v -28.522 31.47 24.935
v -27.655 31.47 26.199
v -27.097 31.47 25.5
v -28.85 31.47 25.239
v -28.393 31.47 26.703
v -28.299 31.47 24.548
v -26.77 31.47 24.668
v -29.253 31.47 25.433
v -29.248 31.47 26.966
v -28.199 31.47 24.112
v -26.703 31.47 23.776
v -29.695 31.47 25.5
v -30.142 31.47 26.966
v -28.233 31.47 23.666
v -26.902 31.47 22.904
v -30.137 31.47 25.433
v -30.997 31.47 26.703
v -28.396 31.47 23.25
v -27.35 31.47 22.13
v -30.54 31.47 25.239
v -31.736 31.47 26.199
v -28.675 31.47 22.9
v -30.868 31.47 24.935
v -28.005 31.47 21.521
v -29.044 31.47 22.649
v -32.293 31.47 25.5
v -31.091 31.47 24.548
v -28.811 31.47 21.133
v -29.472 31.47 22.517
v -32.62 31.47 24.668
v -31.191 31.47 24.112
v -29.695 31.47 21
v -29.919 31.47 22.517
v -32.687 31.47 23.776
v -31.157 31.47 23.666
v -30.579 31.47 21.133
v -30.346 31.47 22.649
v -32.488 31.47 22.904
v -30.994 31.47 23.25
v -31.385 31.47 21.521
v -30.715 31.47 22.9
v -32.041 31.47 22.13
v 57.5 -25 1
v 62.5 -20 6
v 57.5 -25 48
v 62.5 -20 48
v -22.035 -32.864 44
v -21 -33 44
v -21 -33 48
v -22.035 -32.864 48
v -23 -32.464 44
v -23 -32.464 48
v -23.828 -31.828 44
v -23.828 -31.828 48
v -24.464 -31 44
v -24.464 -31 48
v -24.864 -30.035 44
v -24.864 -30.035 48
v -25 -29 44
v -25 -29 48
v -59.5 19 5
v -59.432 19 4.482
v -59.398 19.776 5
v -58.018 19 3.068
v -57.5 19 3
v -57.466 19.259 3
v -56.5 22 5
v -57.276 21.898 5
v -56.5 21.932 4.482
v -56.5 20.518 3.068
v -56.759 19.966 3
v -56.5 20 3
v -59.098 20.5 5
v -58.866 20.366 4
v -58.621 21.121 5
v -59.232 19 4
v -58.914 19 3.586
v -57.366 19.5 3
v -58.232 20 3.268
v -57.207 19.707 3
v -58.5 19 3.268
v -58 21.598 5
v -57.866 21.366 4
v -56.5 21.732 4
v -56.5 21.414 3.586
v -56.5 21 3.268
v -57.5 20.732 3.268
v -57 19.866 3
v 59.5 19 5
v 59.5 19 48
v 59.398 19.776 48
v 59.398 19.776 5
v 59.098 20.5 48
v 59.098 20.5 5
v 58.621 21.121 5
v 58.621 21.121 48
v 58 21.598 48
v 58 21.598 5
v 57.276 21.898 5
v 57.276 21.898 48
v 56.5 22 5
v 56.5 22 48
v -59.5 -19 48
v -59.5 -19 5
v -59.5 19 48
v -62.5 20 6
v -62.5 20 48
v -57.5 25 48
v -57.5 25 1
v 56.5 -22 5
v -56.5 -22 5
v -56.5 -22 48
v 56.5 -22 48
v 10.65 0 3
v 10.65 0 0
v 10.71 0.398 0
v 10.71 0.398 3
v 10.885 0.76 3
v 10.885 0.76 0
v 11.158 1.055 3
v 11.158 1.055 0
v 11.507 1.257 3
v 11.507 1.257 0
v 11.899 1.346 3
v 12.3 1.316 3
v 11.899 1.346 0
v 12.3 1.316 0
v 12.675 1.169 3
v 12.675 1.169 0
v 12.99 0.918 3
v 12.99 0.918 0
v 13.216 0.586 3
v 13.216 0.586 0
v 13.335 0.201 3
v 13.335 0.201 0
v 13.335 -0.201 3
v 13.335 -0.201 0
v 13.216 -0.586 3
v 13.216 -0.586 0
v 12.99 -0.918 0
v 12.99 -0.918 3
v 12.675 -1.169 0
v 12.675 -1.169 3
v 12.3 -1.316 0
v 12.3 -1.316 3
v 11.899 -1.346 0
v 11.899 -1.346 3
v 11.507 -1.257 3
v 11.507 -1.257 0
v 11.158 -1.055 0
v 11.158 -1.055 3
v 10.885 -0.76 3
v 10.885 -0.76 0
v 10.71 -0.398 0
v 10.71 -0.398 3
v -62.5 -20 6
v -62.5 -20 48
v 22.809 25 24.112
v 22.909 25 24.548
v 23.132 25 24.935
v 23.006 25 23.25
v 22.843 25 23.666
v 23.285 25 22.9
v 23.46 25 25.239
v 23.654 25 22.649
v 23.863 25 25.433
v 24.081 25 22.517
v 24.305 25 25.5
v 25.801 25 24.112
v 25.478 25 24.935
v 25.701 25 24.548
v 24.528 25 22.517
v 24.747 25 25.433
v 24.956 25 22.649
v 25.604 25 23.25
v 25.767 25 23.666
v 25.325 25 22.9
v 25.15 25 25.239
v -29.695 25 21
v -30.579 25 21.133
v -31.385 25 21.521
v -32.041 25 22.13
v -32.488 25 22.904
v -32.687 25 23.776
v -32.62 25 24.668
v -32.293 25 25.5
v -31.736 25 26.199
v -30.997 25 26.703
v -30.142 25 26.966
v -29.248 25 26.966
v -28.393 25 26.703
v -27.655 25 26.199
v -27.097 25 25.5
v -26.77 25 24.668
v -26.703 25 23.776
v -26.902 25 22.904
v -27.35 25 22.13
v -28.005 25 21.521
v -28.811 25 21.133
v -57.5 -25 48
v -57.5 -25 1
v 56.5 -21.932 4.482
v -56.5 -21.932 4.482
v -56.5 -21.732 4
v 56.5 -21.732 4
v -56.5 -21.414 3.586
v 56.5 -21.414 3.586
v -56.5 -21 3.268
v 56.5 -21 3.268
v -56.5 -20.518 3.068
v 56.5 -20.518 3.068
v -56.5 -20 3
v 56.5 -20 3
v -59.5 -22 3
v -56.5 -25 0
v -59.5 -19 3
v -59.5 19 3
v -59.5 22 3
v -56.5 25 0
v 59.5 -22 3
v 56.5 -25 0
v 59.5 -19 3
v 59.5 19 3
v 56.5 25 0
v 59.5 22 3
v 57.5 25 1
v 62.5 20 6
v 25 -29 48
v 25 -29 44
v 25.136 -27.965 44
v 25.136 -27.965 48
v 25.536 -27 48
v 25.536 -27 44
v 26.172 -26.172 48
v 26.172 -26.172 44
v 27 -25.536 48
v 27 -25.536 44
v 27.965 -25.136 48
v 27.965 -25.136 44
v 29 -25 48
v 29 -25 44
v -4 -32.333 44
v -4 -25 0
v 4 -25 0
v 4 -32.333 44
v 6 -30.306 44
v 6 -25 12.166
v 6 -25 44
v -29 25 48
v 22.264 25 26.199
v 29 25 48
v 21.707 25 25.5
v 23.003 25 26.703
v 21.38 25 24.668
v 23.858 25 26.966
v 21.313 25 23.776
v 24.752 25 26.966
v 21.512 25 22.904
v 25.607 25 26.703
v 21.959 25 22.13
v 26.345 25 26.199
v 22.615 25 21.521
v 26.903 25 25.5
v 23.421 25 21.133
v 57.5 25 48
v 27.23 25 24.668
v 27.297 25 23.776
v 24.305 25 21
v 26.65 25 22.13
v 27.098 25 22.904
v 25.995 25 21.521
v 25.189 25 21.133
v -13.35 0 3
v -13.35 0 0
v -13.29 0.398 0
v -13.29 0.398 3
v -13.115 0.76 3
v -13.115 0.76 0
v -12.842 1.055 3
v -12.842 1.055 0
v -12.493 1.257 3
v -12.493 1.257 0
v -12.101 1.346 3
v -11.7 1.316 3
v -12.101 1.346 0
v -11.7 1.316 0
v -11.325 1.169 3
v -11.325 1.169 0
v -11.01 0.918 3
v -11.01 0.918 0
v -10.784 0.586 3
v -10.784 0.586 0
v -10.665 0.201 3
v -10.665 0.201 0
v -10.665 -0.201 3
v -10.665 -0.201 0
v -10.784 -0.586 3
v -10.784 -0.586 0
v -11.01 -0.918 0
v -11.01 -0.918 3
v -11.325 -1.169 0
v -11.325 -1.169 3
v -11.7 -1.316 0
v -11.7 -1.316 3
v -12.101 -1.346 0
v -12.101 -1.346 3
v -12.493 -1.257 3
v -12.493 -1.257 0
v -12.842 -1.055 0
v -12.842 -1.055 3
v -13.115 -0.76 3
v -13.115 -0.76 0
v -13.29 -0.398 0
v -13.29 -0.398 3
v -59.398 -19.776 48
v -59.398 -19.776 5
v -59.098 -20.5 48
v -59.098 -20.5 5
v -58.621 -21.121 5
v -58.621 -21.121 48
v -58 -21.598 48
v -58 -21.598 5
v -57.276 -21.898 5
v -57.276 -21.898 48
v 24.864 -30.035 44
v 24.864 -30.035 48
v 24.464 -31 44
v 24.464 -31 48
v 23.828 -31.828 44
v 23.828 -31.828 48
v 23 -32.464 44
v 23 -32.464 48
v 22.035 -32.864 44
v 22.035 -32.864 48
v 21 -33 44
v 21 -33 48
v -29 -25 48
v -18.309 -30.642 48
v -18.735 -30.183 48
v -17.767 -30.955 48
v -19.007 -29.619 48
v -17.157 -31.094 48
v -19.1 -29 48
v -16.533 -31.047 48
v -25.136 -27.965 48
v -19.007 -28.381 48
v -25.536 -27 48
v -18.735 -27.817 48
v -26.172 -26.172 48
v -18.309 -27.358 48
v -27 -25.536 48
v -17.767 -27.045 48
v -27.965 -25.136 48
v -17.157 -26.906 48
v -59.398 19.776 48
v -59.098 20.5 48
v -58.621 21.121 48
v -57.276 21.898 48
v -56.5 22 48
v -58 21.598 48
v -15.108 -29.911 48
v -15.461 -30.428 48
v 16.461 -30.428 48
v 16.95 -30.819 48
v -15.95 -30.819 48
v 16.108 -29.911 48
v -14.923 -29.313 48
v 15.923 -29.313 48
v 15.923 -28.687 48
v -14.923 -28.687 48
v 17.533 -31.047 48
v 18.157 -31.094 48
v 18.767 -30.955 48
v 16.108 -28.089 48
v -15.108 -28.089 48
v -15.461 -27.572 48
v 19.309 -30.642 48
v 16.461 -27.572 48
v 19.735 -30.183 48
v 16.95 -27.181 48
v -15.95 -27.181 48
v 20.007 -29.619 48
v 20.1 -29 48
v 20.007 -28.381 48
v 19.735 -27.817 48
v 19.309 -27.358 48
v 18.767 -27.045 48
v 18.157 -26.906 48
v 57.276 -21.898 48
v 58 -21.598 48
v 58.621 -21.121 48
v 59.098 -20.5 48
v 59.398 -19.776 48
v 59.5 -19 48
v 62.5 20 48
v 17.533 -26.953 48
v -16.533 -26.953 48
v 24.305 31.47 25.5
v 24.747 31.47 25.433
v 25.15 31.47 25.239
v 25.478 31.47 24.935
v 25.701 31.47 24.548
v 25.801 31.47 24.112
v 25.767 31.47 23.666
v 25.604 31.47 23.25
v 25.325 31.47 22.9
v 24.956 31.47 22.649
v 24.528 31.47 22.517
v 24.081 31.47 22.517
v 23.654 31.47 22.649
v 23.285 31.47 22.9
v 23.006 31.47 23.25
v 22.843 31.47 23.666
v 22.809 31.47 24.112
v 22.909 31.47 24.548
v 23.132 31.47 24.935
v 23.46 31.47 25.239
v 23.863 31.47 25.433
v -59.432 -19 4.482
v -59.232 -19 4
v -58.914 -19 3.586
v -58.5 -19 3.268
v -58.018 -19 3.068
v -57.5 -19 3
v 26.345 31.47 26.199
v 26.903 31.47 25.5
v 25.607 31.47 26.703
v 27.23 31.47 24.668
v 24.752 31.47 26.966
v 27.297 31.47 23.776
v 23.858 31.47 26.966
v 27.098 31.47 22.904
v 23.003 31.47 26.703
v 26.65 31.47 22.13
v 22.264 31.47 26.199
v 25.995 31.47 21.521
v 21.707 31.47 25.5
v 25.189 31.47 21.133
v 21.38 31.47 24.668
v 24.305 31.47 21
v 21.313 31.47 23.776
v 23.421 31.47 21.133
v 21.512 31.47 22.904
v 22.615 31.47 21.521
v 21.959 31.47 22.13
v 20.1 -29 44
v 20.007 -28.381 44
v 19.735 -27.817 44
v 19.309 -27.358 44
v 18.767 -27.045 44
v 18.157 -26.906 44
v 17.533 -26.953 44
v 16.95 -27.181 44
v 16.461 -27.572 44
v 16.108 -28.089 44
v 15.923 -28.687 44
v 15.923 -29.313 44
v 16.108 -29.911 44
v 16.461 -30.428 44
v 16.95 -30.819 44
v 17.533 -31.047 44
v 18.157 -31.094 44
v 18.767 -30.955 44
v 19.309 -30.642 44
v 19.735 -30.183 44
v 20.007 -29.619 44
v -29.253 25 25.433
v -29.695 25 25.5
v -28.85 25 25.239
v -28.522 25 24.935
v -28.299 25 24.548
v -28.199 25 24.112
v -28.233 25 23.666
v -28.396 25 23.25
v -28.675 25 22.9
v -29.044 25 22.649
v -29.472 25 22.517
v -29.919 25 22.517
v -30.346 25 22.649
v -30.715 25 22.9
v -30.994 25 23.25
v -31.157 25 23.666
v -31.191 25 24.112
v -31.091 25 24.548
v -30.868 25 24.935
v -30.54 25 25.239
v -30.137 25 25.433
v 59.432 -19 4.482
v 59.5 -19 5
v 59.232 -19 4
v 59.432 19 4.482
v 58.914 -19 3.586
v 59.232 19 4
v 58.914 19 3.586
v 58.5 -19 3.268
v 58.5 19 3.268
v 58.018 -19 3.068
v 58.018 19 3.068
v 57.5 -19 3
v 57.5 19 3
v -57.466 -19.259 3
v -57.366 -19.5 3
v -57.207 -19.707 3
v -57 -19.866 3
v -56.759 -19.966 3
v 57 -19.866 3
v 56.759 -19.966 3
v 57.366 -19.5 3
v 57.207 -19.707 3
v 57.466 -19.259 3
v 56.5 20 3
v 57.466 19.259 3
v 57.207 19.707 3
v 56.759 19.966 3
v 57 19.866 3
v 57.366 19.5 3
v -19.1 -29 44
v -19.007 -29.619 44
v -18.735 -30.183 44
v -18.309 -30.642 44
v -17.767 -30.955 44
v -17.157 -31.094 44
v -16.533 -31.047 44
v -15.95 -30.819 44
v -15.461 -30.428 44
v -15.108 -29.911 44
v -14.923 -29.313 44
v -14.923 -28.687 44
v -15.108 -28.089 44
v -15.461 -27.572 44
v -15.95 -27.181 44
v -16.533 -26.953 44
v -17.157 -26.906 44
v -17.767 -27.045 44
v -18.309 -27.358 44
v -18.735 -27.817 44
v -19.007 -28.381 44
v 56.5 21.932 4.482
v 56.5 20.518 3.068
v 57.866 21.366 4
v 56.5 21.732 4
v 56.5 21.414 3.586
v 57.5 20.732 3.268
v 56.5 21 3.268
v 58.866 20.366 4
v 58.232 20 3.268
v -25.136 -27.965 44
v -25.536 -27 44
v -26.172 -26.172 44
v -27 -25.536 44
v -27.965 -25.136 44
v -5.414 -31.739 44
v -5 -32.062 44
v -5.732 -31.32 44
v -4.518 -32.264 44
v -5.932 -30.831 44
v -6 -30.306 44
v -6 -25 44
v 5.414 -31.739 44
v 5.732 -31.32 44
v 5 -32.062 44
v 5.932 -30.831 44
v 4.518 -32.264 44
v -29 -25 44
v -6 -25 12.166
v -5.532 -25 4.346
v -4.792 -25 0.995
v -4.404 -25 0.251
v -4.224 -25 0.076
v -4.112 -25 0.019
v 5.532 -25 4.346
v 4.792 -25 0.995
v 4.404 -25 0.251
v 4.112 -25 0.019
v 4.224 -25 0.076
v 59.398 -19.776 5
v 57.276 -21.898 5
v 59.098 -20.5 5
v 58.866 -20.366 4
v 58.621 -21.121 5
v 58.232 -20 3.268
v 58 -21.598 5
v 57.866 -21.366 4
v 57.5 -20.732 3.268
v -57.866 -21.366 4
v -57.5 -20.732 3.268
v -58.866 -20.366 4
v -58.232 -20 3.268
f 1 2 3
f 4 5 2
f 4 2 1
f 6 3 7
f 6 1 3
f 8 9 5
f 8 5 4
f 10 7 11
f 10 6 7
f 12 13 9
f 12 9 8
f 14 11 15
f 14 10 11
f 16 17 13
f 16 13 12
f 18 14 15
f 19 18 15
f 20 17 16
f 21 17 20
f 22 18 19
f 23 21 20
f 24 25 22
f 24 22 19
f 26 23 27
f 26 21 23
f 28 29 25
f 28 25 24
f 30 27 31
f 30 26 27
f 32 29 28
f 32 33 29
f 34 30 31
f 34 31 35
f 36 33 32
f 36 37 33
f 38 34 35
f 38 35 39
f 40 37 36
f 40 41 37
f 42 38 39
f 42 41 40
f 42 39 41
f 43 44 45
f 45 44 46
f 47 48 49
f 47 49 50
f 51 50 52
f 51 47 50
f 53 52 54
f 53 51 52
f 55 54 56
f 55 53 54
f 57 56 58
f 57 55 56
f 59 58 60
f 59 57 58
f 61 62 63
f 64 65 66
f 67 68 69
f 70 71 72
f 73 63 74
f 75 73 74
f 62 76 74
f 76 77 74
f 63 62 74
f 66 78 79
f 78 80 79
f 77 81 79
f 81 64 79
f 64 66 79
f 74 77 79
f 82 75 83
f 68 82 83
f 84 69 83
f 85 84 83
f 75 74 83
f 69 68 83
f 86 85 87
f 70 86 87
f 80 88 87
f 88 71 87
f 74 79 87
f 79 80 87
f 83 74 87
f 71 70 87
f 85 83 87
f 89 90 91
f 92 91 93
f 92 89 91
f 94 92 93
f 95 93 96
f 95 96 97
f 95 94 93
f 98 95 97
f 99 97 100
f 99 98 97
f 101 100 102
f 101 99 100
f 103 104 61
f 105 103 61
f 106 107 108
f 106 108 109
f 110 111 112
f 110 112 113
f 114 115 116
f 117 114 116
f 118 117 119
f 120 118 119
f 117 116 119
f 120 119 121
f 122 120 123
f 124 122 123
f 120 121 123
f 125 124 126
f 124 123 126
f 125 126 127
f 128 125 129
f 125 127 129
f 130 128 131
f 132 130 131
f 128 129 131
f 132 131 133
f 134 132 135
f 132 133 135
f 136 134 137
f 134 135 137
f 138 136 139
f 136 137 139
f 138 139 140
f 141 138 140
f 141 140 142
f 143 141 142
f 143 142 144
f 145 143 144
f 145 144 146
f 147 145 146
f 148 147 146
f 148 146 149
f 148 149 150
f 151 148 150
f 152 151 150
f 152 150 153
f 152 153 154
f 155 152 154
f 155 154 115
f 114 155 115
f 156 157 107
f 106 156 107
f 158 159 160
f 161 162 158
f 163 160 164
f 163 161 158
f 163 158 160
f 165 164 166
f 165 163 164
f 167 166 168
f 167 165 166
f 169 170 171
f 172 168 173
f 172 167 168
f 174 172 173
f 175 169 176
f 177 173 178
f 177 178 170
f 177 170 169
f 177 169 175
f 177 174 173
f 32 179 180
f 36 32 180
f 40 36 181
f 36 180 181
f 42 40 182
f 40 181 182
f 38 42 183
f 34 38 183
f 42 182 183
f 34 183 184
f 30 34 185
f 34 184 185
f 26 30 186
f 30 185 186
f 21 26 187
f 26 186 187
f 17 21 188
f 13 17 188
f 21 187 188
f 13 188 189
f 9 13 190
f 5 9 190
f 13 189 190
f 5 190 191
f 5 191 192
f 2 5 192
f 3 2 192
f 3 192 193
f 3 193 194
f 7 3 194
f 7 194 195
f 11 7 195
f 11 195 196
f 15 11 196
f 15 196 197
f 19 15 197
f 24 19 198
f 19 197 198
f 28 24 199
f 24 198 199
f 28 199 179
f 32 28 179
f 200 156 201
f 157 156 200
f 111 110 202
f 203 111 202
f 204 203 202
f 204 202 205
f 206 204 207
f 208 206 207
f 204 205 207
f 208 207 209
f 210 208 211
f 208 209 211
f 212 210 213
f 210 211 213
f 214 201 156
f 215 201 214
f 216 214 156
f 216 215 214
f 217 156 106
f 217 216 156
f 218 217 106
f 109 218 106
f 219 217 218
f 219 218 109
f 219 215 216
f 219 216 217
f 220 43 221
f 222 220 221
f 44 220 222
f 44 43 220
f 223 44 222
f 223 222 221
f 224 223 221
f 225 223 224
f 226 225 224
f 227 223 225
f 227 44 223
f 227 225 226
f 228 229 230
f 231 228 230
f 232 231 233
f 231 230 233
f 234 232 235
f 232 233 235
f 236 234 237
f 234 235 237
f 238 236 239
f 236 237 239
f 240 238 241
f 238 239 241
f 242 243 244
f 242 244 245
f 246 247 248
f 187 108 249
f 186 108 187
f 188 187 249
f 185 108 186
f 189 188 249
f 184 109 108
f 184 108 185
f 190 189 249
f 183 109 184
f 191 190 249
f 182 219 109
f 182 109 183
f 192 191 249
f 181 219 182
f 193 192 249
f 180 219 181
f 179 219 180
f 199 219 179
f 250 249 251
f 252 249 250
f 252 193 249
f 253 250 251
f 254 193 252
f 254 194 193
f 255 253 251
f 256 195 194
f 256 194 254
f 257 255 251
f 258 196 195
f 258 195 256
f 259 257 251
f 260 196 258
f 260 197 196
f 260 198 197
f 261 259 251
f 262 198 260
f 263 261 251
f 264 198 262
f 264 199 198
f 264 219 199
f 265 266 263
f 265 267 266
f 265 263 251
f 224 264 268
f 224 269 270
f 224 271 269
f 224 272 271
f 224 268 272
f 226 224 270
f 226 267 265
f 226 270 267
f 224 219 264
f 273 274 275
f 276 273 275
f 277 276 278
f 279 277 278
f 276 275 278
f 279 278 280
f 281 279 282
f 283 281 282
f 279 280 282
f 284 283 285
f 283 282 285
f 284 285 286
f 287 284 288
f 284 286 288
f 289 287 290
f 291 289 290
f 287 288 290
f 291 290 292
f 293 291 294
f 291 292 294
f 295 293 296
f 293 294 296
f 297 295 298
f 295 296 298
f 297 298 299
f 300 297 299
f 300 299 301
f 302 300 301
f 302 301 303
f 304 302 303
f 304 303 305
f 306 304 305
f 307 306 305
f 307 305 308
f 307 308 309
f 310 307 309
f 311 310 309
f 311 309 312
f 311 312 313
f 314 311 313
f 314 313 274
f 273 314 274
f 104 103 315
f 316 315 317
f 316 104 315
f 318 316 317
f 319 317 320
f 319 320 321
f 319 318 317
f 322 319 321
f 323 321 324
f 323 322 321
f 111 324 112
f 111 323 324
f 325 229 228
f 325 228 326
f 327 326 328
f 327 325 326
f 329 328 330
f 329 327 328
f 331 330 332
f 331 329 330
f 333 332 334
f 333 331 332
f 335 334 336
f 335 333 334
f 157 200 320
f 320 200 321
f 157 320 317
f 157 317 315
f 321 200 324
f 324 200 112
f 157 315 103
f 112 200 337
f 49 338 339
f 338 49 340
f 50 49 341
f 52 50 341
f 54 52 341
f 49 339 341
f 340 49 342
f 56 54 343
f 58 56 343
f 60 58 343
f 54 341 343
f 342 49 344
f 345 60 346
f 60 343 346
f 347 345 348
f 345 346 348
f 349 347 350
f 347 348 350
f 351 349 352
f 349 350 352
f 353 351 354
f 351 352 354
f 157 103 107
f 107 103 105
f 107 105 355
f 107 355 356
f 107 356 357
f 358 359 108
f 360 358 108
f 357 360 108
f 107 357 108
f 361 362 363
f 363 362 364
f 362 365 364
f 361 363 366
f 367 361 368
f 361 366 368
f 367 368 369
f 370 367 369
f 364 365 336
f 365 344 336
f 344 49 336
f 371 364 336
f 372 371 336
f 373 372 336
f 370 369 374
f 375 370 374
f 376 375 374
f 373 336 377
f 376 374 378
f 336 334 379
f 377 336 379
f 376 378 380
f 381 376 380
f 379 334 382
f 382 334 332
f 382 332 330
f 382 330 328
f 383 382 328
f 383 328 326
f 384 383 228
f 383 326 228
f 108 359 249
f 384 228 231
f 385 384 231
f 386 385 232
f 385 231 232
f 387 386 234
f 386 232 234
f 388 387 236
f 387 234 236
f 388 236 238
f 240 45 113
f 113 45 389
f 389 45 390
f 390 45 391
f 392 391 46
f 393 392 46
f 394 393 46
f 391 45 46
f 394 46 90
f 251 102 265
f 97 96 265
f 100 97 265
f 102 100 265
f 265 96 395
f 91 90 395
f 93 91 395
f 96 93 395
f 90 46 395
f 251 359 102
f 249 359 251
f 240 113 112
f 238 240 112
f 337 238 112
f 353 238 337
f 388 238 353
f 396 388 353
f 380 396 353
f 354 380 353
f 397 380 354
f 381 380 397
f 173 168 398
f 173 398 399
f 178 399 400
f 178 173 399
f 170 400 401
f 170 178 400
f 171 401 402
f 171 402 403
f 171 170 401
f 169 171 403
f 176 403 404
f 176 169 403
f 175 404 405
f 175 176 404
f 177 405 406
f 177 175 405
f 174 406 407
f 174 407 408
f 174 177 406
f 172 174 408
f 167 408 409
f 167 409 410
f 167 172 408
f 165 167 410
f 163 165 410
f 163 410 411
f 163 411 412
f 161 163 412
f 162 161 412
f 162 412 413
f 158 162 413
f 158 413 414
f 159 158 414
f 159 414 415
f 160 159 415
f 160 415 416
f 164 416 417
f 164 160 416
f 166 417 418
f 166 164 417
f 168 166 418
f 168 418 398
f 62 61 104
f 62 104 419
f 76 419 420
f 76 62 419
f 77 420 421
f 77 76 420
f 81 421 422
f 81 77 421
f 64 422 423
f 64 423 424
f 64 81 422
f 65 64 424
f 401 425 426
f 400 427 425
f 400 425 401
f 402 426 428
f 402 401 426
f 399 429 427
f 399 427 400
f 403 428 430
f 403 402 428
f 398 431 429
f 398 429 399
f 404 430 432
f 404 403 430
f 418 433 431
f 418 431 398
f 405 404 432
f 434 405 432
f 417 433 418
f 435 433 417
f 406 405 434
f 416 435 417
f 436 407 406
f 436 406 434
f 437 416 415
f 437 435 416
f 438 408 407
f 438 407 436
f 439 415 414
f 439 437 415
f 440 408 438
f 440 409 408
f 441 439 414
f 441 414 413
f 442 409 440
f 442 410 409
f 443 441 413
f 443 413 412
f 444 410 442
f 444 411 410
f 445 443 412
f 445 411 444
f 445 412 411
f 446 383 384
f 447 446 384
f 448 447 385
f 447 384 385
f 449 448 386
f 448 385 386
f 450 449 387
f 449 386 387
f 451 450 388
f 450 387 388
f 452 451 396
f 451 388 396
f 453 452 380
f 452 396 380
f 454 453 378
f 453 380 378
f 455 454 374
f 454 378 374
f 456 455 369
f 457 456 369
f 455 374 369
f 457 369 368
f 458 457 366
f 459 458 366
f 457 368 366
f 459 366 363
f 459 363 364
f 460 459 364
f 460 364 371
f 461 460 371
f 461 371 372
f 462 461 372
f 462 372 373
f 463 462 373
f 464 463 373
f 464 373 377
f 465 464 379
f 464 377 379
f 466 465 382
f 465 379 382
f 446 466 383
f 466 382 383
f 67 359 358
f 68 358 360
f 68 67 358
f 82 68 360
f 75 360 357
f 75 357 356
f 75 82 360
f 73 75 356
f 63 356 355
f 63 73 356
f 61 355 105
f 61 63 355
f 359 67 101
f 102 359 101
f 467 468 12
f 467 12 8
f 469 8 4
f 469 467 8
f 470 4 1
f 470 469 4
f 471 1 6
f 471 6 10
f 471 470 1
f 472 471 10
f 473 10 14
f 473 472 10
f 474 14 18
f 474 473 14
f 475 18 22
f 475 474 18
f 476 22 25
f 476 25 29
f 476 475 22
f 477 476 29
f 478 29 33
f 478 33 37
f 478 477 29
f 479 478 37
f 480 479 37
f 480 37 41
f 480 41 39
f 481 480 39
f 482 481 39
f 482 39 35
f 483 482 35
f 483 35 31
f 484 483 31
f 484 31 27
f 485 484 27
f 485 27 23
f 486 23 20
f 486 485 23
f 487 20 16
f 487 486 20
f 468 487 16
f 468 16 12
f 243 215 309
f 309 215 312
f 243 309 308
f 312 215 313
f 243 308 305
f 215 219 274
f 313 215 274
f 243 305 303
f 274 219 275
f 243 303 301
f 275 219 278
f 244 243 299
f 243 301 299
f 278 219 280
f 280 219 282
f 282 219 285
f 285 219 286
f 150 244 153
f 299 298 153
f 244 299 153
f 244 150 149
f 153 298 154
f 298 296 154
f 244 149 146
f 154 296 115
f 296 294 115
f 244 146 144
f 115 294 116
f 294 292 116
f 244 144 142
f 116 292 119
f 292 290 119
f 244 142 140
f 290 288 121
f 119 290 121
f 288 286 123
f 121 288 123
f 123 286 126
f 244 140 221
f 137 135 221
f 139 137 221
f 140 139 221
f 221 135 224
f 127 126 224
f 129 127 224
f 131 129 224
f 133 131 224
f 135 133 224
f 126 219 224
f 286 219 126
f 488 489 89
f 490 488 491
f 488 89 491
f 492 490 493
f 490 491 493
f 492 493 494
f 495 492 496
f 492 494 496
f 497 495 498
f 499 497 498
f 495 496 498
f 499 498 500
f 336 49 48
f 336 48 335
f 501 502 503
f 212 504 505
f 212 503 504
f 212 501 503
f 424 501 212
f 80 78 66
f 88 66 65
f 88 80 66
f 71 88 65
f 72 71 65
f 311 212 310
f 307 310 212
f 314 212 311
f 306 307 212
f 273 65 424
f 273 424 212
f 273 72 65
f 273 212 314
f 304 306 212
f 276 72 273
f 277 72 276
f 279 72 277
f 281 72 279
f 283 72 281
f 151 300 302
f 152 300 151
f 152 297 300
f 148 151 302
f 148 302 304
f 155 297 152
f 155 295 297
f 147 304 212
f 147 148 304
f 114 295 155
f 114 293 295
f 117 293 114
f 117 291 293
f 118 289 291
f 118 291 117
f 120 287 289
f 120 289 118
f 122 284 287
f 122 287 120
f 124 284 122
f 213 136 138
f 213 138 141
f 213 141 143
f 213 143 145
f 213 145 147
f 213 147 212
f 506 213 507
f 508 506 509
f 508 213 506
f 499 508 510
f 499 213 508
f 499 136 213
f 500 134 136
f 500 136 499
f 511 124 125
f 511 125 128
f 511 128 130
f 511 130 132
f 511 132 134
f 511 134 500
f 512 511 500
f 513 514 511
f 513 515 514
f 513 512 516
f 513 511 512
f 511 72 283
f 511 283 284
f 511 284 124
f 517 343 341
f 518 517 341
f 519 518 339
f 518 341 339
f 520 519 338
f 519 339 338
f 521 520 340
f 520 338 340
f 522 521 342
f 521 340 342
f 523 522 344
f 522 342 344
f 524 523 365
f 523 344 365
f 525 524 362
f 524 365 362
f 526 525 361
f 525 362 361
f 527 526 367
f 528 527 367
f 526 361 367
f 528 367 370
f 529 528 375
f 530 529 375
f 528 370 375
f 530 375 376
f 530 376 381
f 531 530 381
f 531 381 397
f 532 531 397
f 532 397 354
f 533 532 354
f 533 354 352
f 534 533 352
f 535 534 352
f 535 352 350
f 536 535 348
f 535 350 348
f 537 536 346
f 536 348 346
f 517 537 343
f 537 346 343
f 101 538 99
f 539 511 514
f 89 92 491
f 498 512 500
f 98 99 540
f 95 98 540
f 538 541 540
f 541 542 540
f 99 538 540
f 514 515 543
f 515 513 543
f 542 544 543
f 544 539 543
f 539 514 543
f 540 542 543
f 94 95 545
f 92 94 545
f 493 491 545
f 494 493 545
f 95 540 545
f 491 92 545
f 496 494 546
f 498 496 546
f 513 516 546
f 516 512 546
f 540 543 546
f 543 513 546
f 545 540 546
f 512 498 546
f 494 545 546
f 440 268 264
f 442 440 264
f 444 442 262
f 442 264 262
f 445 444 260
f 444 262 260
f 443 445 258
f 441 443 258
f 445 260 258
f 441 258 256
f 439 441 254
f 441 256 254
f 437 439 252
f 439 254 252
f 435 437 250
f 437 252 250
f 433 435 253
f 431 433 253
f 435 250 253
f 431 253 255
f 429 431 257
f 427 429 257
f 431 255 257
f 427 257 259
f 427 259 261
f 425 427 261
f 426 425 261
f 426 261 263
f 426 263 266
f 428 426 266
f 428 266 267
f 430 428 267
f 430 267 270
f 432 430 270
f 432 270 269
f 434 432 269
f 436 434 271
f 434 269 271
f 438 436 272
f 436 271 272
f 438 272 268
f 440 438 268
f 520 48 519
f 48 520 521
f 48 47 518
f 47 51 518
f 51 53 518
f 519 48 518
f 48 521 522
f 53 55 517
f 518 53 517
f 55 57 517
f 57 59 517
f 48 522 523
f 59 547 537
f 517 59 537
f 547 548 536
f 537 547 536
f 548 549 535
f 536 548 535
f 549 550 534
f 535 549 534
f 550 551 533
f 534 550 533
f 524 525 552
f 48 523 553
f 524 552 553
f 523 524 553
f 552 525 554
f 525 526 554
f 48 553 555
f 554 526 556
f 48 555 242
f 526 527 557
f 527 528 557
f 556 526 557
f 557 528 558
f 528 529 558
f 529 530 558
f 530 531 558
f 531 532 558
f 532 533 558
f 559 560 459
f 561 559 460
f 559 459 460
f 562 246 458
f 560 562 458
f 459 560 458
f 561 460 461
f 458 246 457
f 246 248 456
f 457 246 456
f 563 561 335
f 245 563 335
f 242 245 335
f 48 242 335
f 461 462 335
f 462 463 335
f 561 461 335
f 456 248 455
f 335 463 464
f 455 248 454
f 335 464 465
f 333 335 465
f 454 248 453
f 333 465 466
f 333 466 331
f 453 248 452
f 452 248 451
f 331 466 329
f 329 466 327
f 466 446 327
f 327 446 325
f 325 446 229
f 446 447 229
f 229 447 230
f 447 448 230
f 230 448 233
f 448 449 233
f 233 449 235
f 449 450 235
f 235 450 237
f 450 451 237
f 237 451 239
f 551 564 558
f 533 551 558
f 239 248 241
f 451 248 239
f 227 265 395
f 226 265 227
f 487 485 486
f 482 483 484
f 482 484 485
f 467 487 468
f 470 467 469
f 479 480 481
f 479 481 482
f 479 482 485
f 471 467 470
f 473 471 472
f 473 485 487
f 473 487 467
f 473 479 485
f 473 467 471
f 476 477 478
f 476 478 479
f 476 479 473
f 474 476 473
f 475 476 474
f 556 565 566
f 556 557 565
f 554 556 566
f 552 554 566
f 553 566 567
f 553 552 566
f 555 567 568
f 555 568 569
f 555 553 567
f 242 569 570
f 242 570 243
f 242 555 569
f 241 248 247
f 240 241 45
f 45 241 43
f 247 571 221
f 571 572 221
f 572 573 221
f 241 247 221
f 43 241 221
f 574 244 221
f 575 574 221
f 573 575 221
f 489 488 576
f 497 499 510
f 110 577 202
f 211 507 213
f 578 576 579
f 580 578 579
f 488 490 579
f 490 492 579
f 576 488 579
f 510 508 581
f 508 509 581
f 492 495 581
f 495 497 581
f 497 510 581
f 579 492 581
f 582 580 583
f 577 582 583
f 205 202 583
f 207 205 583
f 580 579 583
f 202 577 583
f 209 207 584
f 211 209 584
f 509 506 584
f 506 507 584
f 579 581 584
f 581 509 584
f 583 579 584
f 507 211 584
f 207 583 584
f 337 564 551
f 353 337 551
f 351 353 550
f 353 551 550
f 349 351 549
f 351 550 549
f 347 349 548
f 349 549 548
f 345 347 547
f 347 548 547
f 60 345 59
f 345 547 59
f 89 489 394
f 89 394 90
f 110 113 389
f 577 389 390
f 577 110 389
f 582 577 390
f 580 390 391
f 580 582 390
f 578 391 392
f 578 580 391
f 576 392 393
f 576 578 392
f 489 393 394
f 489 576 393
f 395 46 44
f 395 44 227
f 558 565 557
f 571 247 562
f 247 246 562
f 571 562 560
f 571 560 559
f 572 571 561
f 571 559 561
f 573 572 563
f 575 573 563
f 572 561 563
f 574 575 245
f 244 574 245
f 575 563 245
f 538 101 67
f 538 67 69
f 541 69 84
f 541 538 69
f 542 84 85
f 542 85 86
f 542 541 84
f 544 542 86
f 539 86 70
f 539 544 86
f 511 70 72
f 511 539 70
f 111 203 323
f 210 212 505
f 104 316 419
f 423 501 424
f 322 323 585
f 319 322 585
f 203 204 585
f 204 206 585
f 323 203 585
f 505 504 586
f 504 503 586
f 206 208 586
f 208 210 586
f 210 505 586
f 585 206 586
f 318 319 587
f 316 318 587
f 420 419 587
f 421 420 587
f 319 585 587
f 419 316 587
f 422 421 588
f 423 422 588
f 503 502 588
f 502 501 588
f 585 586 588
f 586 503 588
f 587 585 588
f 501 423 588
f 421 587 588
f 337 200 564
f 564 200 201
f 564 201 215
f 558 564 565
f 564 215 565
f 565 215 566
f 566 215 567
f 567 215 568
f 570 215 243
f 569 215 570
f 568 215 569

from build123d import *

# Parameters (mm, degrees)
SKETCH_1_W             = 125
SKETCH_1_H             = 50
EXTRUDE_1_DEPTH        = 3
SKETCH_2_W             = 125
SKETCH_2_H             = 50
SKETCH_2_W_2           = 119
SKETCH_2_H_2           = 44
EXTRUDE_2_DEPTH        = 45
EXTRUDE_START          = 33
EXTRUDE_3_DEPTH        = 12
SKETCH_6_W             = 50
SKETCH_6_H             = 8
SKETCH_6_R             = 2.1
EXTRUDE_7_DEPTH        = 4
FILLET_START           = 43
FILLET_10_DEPTH        = 5
FILLET_START_2         = 44
FILLET_10_2_DEPTH      = 4
CHAMFER_2_SIZE         = 6
FILLET_12_R            = 2
CHAMFER_3_SIZE         = 5
SKETCH_7_R             = 1.35
CUT_EXTRUDE_1_DEPTH    = 86.435648297
PATTERN_LINEAR_2_COUNT = 2
PATTERN_LINEAR_2_PITCH = 39
FILLET_13_R            = 2
SKETCH_8_W             = 12
SKETCH_8_H             = 8
CUT_EXTRUDE_2_DEPTH    = 86.435648297
FILLET_14_R            = 3
SKETCH_9_W             = 61.451933819
SKETCH_9_H             = 10.261376853
CUT_EXTRUDE_3_DEPTH    = 70
SKETCH_10_R            = 3
SKETCH_10_R_2          = 1.5
EXTRUDE_8_DEPTH        = 6.47


with BuildPart() as part:
    # 草图1 → 凸台-拉伸1 (new body)
    with BuildSketch(Plane.XY):
        Rectangle(SKETCH_1_W, SKETCH_1_H)
    extrude(amount=EXTRUDE_1_DEPTH)

    # 草图2 → 凸台-拉伸2 (add)
    with BuildSketch(Plane.XY.offset(3)):
        Rectangle(SKETCH_2_W, SKETCH_2_H)
        Rectangle(SKETCH_2_W_2, SKETCH_2_H_2, mode=Mode.SUBTRACT)
    extrude(amount=EXTRUDE_2_DEPTH)

    # 草图3 → 凸台-拉伸3 (add)
    with BuildSketch(Plane(origin=(0, 0, 0), x_dir=(0, 0, -1), z_dir=(1, 0, 0)).offset(EXTRUDE_START)):
        Polygon((0, 25), (-48, 33), (-48, 25), align=None)
        Polygon((-48, -25), (0, -25), (-48, -33), align=None)
    extrude_3 = extrude(amount=EXTRUDE_3_DEPTH)

    # 草图6 → 凸台-拉伸7 (add)
    # profile 1 of 2: a face of its own
    with BuildSketch(Plane.XY.offset(48)):
        with Locations((0, 29)):
            Rectangle(SKETCH_6_W, SKETCH_6_H)
        with Locations((-17, 29)):
            Circle(SKETCH_6_R, mode=Mode.SUBTRACT)
        with Locations((18, 29)):
            Circle(SKETCH_6_R, mode=Mode.SUBTRACT)
    # profile 2 of 2: a face of its own
    with BuildSketch(Plane.XY.offset(48)):
        with Locations((0, -29)):
            Rectangle(SKETCH_6_W, SKETCH_6_H)
        with Locations(Location((-17, -29, 0), (0, 0, 180))):
            Circle(SKETCH_6_R, mode=Mode.SUBTRACT)
        with Locations((18, -29)):
            Circle(SKETCH_6_R, mode=Mode.SUBTRACT)
    extrude(amount=-EXTRUDE_7_DEPTH)

    # 圆角10: read off the stored shape, not the designer's step
    # 圆角10 outline → 圆角10 (cut)
    with BuildSketch(Plane.XY.offset(FILLET_START)):
        with BuildLine():
            ThreePointArc((25, -29), (23.828427125, -31.828427125), (21, -33))
            Line((21, -33), (25, -33))
            Line((25, -33), (25, -29))
        make_face()
        with BuildLine():
            Line((-25, -33), (-21, -33))
            ThreePointArc((-21, -33), (-23.828427125, -31.828427125), (-25, -29))
            Line((-25, -29), (-25, -33))
        make_face()
        with BuildLine():
            ThreePointArc((-25, 29), (-23.828427125, 31.828427125), (-21, 33))
            Line((-21, 33), (-25, 33))
            Line((-25, 33), (-25, 29))
        make_face()
        with BuildLine():
            Line((25, 33), (21, 33))
            ThreePointArc((21, 33), (23.828427125, 31.828427125), (25, 29))
            Line((25, 29), (25, 33))
        make_face()
    extrude(amount=FILLET_10_DEPTH, mode=Mode.SUBTRACT)

    # Fillet 10 2 outline → Fillet 10 2 (add)
    with BuildSketch(Plane.XY.offset(FILLET_START_2)):
        with BuildLine():
            Line((25, -25), (25, -29))
            ThreePointArc((25, -29), (26.171572875, -26.171572875), (29, -25))
            Line((29, -25), (25, -25))
        make_face()
        with BuildLine():
            ThreePointArc((-29, -25), (-26.171572875, -26.171572875), (-25, -29))
            Line((-25, -29), (-25, -25))
            Line((-25, -25), (-29, -25))
        make_face()
        with BuildLine():
            Line((-25, 25), (-25, 29))
            ThreePointArc((-25, 29), (-26.171572875, 26.171572875), (-29, 25))
            Line((-29, 25), (-25, 25))
        make_face()
        with BuildLine():
            ThreePointArc((29, 25), (26.171572875, 26.171572875), (25, 29))
            Line((25, 29), (25, 25))
            Line((25, 25), (29, 25))
        make_face()
    extrude(amount=FILLET_10_2_DEPTH)

    # 倒角2
    chamfer_2_edges = [part.edges().sort_by_distance(p)[0] for p in [
        (-62.5, 0, 0),
        (62.5, 0, 0),
    ]]
    chamfer(chamfer_2_edges, length=CHAMFER_2_SIZE)

    # 圆角12
    fillet_12_edges = [part.edges().sort_by_distance(p)[0] for p in [
        (0, -22, 3),
        (59.5, 0, 3),
        (0, 22, 3),
        (-59.5, 0, 3),
    ]]
    fillet(fillet_12_edges, radius=FILLET_12_R)

    # 倒角3
    chamfer_3_edges = [part.edges().sort_by_distance(p)[0] for p in [
        (62.5, -25, 27),
        (-62.5, -25, 27),
        (-62.5, 25, 27),
        (62.5, 25, 27),
    ]]
    chamfer(chamfer_3_edges, length=CHAMFER_3_SIZE)

    # 草图7 → 切除-拉伸1 (cut, through all)
    with BuildSketch(Plane(origin=(0, 0, 0), x_dir=(-1, 0, 0), z_dir=(0, 0, -1))):
        with Locations((-12, 0)):
            Circle(SKETCH_7_R)
        with Locations((12, 0)):
            Circle(SKETCH_7_R)
    extrude(amount=-CUT_EXTRUDE_1_DEPTH, mode=Mode.SUBTRACT)

    # 阵列(线性)2: 凸台-拉伸3 ×2
    with Locations(*[(-i * PATTERN_LINEAR_2_PITCH, 0, 0) for i in range(1, PATTERN_LINEAR_2_COUNT)]):
        add(extrude_3)

    # 圆角13
    fillet_13_edges = [part.edges().sort_by_distance(p)[0] for p in [
        (-6, 28.666666667, 22),
        (6, 28.666666667, 22),
        (-6, -28.666666667, 22),
        (6, -28.666666667, 22),
    ]]
    fillet(fillet_13_edges, radius=FILLET_13_R)

    # 草图8 → 切除-拉伸2 (cut, through all)
    with BuildSketch(Plane.XY.offset(48)):
        with Locations((39, 29)):
            Rectangle(SKETCH_8_W, SKETCH_8_H)
        with Locations((39, -29)):
            Rectangle(SKETCH_8_W, SKETCH_8_H)
    extrude(amount=-CUT_EXTRUDE_2_DEPTH, mode=Mode.SUBTRACT)

    # 圆角14
    # the kernel refuses this fillet: 3 mm, written as the material it adds along each edge
    with BuildSketch(Plane(origin=(56.5, 19, 3), x_dir=(0, 1, 0), z_dir=(-1, 0, 0))) as fillet_14_piece_1:
        with BuildLine():
            CenterArc((1, -2), 2, 0, 90)
            Line((3, -2), (3, 0))
            Line((3, 0), (1, 0))
        make_face()
    revolve(axis=Axis((56.5, 19, 3), (0, 0, -1)), revolution_arc=90)
    with BuildSketch(Plane(origin=(56.5, -19, 3), x_dir=(1, 0, 0), z_dir=(0, 1, 0))) as fillet_14_piece_2:
        with BuildLine():
            CenterArc((1, -2), 2, 0, 90)
            Line((3, -2), (3, 0))
            Line((3, 0), (1, 0))
        make_face()
    revolve(axis=Axis((56.5, -19, 3), (0, 0, -1)), revolution_arc=90)
    with BuildSketch(Plane(origin=(-56.5, 19, 3), x_dir=(-1, 0, 0), z_dir=(0, -1, 0))) as fillet_14_piece_3:
        with BuildLine():
            CenterArc((1, -2), 2, 0, 90)
            Line((3, -2), (3, 0))
            Line((3, 0), (1, 0))
        make_face()
    revolve(axis=Axis((-56.5, 19, 3), (0, 0, -1)), revolution_arc=90)
    with BuildSketch(Plane(origin=(-56.5, -19, 3), x_dir=(0, -1, 0), z_dir=(1, 0, 0))) as fillet_14_piece_4:
        with BuildLine():
            CenterArc((1, -2), 2, 0, 90)
            Line((3, -2), (3, 0))
            Line((3, 0), (1, 0))
        make_face()
    revolve(axis=Axis((-56.5, -19, 3), (0, 0, -1)), revolution_arc=90)
    with BuildSketch(Plane(origin=(59.5, -22, 3), x_dir=(0, 1, 0), z_dir=(0, 0, 1))) as fillet_14_piece_5:
        with BuildLine():
            CenterArc((FILLET_14_R, FILLET_14_R), FILLET_14_R, 180, 90)
            Line((0, FILLET_14_R), (0, 0))
            Line((0, 0), (FILLET_14_R, 0))
        make_face()
    extrude(amount=45)
    with BuildSketch(Plane(origin=(59.5, 22, 3), x_dir=(0, -1, 0), z_dir=(0, 0, 1)), Plane(origin=(-59.5, 22, 3), x_dir=(1, 0, 0), z_dir=(0, 0, 1)), Plane(origin=(-59.5, -22, 3), x_dir=(0, 1, 0), z_dir=(0, 0, 1))) as fillet_14_piece_6:
        with BuildLine():
            CenterArc((FILLET_14_R, -FILLET_14_R), FILLET_14_R, 90, 90)
            Line((0, -FILLET_14_R), (0, 0))
            Line((0, 0), (FILLET_14_R, 0))
        make_face()
    extrude(amount=45)

    # 草图9 → 切除-拉伸3 (cut)
    with BuildSketch(Plane(origin=(0, 0, 0), x_dir=(-1, 0, 0), z_dir=(0, 0, -1))):
        with Locations((1.72596691, 30.130688427)):
            Rectangle(SKETCH_9_W, SKETCH_9_H)
    extrude(amount=-CUT_EXTRUDE_3_DEPTH, mode=Mode.SUBTRACT)

    # 草图10 → 凸台-拉伸8 (add)
    # profile 1 of 2: a face of its own
    with BuildSketch(Plane(origin=(0, 25, 0), x_dir=(1, 0, 0), z_dir=(0, 1, 0))):
        with Locations(Location((-29.695093854, -24, 0), (0, 0, 90))):
            Circle(SKETCH_10_R)
        with Locations(Location((-29.695093854, -24, 0), (0, 0, 270))):
            Circle(SKETCH_10_R_2, mode=Mode.SUBTRACT)
    # profile 2 of 2: a face of its own
    with BuildSketch(Plane(origin=(0, 25, 0), x_dir=(1, 0, 0), z_dir=(0, 1, 0))):
        with Locations(Location((24.304906146, -24, 0), (0, 0, 90))):
            Circle(SKETCH_10_R)
        with Locations(Location((24.304906146, -24, 0), (0, 0, 270))):
            Circle(SKETCH_10_R_2, mode=Mode.SUBTRACT)
    extrude(amount=EXTRUDE_8_DEPTH)


solid = part.part
